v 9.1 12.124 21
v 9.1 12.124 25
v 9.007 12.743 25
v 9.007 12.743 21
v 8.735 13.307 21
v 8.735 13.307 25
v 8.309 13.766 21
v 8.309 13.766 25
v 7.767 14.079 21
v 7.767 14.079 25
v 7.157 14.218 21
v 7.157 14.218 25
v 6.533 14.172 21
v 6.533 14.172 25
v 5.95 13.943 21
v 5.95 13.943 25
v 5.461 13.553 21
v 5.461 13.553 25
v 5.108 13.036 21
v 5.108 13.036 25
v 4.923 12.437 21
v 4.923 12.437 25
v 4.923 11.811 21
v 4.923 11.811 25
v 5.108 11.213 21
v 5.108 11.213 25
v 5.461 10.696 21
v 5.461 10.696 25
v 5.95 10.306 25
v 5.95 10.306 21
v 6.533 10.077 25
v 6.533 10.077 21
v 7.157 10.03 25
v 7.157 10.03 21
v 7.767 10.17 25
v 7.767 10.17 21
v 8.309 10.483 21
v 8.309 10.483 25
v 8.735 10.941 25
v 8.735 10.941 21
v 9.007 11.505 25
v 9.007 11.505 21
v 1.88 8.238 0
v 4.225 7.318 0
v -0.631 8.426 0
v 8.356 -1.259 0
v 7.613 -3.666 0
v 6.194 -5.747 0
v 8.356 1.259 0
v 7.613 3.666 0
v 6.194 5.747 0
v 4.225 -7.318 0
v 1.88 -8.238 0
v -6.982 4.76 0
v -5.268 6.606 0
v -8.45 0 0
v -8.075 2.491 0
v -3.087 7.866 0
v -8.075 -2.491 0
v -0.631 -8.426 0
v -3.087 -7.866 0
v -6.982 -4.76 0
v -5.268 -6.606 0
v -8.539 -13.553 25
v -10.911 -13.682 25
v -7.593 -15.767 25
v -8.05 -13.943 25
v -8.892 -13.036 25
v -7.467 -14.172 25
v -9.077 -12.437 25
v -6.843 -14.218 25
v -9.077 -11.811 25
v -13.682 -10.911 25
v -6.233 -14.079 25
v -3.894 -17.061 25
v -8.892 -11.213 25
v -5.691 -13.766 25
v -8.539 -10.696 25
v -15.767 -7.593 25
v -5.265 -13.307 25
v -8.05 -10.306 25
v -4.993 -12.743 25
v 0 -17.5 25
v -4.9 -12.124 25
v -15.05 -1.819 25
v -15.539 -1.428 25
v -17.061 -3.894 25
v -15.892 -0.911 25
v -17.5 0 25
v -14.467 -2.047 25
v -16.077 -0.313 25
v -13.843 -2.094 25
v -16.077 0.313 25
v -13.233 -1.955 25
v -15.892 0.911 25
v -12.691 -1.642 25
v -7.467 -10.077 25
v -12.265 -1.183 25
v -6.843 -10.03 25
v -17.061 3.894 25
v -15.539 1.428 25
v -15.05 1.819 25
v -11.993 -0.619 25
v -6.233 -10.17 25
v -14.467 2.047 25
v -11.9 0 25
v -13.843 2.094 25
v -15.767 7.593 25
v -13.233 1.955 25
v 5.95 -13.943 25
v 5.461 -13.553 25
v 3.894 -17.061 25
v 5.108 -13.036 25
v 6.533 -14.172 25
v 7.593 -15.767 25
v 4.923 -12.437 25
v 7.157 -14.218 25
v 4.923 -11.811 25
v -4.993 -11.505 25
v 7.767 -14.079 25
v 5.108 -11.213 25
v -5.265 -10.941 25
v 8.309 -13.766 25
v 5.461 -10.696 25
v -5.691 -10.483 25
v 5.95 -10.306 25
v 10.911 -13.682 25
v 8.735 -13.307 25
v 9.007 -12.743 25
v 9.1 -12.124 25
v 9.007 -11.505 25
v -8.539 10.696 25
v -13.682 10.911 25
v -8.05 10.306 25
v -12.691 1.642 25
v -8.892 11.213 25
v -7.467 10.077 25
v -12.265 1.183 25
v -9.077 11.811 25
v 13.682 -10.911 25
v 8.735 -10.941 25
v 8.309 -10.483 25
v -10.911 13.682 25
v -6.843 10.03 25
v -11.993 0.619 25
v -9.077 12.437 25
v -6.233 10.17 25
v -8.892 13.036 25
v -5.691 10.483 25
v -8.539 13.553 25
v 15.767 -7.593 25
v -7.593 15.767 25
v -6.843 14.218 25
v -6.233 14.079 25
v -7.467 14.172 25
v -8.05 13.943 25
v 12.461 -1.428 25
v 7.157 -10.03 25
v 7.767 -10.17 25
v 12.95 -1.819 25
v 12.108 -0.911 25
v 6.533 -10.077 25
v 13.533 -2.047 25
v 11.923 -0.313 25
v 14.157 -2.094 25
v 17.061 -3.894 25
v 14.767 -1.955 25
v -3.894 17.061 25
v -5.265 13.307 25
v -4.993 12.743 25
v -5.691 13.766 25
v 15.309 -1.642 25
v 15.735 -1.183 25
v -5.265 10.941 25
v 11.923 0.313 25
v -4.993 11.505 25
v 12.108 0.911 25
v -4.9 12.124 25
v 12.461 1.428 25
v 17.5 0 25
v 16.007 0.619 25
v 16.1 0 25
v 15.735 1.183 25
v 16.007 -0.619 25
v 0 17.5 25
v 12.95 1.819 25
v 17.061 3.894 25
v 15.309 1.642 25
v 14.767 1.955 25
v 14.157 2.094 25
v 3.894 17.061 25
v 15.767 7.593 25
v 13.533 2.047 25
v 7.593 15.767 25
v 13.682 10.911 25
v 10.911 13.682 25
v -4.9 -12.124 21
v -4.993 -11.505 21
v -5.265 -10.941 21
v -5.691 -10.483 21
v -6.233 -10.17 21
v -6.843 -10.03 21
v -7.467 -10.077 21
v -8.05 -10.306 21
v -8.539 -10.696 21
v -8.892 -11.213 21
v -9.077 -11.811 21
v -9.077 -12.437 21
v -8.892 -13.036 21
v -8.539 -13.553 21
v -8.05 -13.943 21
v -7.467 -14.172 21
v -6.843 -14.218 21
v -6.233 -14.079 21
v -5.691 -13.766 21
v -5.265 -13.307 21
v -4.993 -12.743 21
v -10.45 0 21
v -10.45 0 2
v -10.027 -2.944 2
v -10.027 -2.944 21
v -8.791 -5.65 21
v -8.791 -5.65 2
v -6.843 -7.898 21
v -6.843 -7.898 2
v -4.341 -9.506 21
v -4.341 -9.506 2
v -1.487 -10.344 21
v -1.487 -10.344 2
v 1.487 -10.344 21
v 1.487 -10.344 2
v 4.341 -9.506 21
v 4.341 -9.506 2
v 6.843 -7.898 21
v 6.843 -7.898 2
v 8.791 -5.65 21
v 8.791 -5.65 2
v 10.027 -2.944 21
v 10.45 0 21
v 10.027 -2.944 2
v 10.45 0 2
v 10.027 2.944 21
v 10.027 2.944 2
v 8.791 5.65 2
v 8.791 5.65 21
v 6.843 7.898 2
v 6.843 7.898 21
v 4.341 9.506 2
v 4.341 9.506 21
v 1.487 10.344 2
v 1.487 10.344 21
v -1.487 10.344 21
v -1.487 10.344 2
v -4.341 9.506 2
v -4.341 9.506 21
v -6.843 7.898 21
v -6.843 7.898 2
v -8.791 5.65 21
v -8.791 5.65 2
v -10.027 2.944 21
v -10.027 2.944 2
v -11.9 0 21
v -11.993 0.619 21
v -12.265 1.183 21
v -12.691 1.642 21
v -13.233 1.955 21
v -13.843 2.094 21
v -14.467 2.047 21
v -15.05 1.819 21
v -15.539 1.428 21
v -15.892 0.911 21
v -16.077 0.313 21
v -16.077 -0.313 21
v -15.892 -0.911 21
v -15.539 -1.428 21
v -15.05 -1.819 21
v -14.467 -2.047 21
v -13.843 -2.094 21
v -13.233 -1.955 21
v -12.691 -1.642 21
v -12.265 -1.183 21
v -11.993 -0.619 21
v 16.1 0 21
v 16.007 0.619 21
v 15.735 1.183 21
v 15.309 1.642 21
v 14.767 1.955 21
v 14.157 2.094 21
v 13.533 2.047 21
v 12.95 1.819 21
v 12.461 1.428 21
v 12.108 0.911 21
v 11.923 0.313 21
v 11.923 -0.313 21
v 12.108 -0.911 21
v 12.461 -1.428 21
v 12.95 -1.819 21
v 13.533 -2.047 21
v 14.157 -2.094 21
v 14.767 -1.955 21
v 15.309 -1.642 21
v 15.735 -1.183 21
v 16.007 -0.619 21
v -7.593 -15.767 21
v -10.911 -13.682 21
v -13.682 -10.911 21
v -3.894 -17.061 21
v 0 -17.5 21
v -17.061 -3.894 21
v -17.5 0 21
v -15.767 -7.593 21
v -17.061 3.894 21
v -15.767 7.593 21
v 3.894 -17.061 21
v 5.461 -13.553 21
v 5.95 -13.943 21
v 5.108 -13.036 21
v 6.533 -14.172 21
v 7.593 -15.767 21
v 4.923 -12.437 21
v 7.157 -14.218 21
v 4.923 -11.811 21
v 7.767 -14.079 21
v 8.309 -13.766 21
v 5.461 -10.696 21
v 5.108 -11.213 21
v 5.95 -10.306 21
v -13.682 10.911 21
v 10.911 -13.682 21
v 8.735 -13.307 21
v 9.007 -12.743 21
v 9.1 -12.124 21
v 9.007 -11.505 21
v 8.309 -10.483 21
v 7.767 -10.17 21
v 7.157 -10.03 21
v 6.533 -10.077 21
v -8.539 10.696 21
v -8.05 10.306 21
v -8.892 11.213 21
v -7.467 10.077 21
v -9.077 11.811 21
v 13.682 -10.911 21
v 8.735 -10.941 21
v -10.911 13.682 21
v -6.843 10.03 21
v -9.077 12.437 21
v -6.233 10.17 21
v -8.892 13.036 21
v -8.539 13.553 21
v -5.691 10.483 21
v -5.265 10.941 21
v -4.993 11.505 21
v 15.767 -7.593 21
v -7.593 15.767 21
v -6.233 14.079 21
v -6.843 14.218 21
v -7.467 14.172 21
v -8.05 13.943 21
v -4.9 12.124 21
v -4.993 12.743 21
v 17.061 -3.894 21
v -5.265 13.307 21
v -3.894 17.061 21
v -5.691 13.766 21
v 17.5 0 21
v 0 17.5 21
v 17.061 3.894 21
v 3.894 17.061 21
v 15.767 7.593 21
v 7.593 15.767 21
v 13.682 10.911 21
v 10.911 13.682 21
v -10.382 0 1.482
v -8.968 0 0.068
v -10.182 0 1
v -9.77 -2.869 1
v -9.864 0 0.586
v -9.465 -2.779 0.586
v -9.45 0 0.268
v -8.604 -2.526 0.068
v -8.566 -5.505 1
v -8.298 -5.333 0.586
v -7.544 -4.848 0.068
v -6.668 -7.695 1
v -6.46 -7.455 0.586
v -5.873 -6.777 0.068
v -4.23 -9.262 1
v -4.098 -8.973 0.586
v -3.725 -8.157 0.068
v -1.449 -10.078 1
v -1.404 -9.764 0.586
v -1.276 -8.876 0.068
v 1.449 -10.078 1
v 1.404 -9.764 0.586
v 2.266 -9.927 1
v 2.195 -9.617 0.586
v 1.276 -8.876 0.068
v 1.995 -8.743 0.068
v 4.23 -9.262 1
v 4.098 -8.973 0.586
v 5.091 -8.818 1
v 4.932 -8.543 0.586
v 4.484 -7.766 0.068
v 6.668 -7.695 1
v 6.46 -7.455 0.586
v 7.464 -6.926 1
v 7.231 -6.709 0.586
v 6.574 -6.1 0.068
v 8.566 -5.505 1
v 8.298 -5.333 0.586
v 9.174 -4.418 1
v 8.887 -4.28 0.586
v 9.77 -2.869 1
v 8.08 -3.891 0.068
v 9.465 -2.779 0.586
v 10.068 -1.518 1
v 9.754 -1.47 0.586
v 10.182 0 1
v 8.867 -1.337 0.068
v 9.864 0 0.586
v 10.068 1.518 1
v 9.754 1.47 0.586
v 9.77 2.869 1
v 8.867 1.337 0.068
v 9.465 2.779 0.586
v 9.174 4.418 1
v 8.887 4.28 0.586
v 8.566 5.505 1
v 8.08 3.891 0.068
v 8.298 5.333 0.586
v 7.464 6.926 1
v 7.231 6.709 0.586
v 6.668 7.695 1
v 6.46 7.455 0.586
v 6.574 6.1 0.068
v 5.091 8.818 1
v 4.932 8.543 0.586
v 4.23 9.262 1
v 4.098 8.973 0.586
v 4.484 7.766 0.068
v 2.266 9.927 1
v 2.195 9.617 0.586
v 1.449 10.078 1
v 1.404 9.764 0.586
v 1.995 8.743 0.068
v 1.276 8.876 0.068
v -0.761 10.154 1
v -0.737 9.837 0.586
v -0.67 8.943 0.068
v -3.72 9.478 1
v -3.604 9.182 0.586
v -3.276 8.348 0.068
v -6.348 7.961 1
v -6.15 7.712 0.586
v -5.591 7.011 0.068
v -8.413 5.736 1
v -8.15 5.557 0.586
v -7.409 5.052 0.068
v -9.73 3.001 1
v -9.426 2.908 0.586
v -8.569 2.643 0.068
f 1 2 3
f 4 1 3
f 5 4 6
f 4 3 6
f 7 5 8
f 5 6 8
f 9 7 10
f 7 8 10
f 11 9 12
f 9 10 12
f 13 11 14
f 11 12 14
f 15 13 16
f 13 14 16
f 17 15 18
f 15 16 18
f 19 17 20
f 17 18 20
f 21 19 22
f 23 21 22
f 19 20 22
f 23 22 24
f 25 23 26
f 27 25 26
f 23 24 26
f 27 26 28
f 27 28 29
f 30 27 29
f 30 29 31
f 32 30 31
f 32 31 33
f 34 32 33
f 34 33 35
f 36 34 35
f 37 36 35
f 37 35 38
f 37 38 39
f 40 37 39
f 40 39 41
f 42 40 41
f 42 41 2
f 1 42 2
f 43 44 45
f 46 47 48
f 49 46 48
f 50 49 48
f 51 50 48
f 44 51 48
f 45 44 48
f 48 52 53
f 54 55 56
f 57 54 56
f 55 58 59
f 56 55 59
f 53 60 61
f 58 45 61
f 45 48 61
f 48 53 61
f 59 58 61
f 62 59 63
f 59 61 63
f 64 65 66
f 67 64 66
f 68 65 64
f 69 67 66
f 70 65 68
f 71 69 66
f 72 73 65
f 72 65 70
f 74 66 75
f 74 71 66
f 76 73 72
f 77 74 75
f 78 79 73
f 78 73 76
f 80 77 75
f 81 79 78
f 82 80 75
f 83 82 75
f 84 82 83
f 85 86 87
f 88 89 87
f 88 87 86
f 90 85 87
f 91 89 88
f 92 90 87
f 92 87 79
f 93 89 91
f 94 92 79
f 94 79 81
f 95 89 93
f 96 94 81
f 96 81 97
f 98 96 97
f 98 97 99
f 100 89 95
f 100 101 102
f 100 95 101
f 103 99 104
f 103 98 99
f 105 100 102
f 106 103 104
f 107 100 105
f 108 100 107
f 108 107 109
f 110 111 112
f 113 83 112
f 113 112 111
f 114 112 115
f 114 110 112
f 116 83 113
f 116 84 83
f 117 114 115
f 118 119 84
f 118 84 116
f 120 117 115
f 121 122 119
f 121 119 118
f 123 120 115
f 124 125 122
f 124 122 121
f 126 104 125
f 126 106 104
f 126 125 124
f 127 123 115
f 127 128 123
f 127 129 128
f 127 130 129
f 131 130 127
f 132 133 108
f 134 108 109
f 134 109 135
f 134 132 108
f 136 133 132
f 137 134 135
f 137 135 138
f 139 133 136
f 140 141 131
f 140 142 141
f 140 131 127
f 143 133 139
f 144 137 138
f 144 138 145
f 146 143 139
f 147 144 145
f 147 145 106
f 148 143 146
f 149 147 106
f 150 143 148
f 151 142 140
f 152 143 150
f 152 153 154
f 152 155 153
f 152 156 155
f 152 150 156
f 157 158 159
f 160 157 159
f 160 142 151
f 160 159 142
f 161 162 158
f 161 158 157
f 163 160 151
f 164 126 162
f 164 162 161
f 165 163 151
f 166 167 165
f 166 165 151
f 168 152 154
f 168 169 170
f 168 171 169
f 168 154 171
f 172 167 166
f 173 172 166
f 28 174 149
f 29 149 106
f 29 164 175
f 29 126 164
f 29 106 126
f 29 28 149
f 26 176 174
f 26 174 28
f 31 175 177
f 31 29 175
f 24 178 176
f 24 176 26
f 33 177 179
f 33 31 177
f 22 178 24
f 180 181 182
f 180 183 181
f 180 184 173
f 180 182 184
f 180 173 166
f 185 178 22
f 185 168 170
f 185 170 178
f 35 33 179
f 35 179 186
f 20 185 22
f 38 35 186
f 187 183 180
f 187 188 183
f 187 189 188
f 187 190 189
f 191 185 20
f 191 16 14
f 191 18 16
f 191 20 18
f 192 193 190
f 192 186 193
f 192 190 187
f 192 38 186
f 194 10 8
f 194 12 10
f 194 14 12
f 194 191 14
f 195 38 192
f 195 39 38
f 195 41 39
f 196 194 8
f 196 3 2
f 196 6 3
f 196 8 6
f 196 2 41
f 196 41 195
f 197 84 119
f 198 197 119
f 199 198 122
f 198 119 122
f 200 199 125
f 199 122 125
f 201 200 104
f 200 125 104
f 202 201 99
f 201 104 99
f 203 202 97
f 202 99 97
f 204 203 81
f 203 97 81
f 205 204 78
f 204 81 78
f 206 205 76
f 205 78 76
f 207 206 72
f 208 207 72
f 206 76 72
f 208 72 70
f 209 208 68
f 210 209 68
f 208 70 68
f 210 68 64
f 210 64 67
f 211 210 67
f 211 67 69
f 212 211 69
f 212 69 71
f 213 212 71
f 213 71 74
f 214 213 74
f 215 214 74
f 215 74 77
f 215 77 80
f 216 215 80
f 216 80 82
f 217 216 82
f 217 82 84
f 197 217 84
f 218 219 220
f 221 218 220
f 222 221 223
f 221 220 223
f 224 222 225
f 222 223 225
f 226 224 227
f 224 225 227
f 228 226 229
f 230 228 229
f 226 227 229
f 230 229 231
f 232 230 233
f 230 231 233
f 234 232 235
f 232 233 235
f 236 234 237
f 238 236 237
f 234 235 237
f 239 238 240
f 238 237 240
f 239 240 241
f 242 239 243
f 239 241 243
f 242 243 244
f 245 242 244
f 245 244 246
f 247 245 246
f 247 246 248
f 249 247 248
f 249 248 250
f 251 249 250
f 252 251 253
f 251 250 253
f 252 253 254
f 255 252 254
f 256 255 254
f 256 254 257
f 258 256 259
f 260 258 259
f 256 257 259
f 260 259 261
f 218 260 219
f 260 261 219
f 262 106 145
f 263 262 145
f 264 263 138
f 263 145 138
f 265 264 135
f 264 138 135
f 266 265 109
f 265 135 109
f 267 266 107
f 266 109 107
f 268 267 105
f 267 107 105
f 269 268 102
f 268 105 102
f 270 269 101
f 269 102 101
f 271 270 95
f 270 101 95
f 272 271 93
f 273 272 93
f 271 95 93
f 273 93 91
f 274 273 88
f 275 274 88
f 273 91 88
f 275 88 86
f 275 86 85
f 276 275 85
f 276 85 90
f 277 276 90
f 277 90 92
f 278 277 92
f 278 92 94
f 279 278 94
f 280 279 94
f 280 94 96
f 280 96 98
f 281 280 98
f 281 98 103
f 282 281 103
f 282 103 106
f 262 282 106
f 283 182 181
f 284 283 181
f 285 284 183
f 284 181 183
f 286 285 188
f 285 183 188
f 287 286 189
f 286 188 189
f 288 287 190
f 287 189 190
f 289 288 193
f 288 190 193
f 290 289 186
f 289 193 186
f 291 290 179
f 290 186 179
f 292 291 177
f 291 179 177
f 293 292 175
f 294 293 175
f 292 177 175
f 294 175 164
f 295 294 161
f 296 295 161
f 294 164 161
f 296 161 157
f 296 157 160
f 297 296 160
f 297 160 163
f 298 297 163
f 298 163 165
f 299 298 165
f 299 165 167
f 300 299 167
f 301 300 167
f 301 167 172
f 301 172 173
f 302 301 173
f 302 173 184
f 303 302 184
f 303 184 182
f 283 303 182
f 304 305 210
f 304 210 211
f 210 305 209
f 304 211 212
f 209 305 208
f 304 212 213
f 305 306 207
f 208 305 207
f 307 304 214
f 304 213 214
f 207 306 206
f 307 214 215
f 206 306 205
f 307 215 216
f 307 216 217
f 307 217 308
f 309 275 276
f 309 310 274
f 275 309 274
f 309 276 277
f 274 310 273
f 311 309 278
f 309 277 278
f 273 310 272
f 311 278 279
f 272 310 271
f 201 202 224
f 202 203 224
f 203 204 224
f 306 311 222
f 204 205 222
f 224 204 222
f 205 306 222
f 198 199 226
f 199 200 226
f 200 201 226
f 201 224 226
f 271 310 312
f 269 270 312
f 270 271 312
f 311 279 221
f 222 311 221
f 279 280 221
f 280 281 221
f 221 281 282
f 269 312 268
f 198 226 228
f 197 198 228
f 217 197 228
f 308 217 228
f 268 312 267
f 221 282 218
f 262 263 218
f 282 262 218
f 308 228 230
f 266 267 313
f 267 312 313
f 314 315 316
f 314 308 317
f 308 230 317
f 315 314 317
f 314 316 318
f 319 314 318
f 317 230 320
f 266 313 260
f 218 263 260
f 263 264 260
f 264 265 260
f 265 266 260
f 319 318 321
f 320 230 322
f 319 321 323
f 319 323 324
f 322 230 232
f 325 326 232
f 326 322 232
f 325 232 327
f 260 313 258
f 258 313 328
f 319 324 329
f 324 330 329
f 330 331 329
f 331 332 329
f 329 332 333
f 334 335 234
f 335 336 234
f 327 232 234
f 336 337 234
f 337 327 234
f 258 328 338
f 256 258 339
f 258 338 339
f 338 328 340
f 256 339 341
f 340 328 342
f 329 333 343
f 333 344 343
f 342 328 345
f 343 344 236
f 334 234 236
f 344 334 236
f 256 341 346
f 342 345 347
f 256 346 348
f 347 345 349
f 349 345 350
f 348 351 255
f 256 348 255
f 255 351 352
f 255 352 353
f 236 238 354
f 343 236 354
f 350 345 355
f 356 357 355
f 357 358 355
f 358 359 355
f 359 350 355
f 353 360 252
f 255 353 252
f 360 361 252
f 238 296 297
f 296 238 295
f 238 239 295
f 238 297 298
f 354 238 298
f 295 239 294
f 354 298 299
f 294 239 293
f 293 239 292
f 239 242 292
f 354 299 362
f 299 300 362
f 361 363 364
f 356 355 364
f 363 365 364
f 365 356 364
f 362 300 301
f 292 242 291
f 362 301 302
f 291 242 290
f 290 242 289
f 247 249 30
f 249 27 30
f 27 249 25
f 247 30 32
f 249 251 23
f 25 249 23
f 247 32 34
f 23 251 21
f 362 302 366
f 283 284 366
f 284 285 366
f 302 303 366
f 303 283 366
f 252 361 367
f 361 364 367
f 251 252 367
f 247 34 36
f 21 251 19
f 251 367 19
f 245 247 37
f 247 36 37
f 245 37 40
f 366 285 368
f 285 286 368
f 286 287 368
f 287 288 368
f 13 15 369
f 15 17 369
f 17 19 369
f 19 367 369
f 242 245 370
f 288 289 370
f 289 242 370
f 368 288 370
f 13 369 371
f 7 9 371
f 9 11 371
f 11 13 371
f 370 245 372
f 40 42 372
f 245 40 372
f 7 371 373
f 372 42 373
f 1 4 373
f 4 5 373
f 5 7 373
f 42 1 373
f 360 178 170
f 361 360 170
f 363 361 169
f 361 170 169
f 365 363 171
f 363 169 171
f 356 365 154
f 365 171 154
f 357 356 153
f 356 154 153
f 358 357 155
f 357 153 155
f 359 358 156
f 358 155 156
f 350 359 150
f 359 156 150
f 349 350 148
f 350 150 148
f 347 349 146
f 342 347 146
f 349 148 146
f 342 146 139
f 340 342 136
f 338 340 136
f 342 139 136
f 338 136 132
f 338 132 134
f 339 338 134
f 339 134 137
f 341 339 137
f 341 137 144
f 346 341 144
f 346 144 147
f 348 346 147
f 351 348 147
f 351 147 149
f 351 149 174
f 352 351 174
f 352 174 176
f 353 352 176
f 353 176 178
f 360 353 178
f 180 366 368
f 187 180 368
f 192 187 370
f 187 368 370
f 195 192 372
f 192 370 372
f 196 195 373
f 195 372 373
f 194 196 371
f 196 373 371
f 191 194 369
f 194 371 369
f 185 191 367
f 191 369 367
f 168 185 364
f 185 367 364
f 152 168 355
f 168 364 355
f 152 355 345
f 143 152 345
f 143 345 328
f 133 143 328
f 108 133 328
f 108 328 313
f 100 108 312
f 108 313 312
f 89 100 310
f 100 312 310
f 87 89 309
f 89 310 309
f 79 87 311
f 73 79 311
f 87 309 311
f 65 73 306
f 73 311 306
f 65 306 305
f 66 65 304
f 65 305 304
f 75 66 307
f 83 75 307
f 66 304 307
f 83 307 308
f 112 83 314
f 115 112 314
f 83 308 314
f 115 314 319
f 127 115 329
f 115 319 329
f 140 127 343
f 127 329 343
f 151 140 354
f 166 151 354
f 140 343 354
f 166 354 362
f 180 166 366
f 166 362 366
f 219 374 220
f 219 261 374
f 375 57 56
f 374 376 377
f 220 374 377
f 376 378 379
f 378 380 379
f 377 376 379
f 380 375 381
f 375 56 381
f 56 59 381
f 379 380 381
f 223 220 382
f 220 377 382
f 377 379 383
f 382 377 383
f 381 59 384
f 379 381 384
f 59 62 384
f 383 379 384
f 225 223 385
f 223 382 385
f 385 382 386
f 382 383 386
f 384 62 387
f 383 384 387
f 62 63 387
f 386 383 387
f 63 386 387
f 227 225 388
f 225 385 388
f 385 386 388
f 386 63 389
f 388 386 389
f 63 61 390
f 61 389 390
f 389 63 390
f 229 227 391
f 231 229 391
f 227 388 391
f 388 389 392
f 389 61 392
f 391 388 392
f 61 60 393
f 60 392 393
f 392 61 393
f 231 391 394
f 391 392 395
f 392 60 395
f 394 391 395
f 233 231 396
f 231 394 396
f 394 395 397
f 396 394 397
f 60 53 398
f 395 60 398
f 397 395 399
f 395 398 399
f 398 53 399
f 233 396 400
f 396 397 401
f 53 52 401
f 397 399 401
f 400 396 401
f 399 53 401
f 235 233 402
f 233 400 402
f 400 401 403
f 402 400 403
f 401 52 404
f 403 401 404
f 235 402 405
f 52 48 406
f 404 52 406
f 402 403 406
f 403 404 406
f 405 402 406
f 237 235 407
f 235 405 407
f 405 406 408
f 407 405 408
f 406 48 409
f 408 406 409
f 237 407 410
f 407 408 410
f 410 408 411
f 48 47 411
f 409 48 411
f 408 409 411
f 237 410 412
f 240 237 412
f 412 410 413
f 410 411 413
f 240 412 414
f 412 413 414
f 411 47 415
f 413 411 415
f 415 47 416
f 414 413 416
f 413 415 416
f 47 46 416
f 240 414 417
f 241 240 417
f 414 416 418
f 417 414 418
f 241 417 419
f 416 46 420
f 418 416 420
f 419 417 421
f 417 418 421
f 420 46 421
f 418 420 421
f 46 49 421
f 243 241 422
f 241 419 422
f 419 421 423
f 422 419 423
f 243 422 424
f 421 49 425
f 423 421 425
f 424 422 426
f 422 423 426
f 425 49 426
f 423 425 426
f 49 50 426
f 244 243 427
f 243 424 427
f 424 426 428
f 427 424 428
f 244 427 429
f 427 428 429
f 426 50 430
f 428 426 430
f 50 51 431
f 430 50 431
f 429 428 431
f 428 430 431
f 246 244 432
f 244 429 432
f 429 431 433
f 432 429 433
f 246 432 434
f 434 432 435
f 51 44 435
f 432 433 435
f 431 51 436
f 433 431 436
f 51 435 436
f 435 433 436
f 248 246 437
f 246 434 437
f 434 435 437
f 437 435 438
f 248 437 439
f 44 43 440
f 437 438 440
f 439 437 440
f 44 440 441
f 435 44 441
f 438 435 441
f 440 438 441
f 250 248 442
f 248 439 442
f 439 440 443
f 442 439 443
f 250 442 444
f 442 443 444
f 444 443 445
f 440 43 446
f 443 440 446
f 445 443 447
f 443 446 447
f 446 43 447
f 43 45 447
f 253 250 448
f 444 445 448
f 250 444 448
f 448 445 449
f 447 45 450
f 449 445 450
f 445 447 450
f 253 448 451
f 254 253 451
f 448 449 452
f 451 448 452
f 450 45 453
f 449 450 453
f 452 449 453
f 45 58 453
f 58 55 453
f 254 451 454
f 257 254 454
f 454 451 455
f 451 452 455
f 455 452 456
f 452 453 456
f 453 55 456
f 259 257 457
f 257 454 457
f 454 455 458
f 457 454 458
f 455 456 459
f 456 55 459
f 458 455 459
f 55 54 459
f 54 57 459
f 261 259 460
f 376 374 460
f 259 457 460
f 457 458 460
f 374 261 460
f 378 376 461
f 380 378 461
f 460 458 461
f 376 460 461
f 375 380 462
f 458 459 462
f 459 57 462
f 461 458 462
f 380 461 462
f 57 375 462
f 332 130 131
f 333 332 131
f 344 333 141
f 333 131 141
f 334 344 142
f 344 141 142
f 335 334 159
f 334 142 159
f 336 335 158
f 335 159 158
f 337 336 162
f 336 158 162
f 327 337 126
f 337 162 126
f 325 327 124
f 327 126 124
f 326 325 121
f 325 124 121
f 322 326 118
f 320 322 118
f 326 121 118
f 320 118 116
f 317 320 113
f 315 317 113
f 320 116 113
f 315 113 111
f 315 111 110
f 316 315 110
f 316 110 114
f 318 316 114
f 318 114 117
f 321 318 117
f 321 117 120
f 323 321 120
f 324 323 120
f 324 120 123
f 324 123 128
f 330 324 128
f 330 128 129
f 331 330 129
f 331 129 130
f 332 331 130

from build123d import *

# Parameters (mm, degrees)
SKETCH1_R           = 10.45
BOSS_EXTRUDE1_DEPTH = 21
SKETCH2_R           = 17.5
BOSS_EXTRUDE2_DEPTH = 4
SKETCH3_R           = 2.1
CUT_EXTRUDE1_DEPTH  = 36.178118199
FILLET1_R           = 2


with BuildPart() as part:
    # Sketch1 → Boss-Extrude1 (new body)
    with BuildSketch(Plane.XY):
        with Locations(Location((0, 0, 0), (0, 0, 180))):
            Circle(SKETCH1_R)
    extrude(amount=BOSS_EXTRUDE1_DEPTH)

    # Sketch2 → Boss-Extrude2 (add)
    with BuildSketch(Plane.XY.offset(21)):
        Circle(SKETCH2_R)
    extrude(amount=BOSS_EXTRUDE2_DEPTH)

    # Sketch3 → Cut-Extrude1 (cut, through all)
    with BuildSketch(Plane.XY.offset(25)):
        with Locations((14, 0)):
            Circle(SKETCH3_R)
        with Locations((7, -12.124355653)):
            Circle(SKETCH3_R)
        with Locations((-7, -12.124355653)):
            Circle(SKETCH3_R)
        with Locations((-14, 0)):
            Circle(SKETCH3_R)
        with Locations((-7, 12.124355653)):
            Circle(SKETCH3_R)
        with Locations((7, 12.124355653)):
            Circle(SKETCH3_R)
    extrude(amount=-CUT_EXTRUDE1_DEPTH, mode=Mode.SUBTRACT)

    # Fillet1
    fillet1_edges = [part.edges().sort_by_distance(p)[0] for p in [
        (10.45, 0, 0),
    ]]
    fillet(fillet1_edges, radius=FILLET1_R)


solid = part.part
